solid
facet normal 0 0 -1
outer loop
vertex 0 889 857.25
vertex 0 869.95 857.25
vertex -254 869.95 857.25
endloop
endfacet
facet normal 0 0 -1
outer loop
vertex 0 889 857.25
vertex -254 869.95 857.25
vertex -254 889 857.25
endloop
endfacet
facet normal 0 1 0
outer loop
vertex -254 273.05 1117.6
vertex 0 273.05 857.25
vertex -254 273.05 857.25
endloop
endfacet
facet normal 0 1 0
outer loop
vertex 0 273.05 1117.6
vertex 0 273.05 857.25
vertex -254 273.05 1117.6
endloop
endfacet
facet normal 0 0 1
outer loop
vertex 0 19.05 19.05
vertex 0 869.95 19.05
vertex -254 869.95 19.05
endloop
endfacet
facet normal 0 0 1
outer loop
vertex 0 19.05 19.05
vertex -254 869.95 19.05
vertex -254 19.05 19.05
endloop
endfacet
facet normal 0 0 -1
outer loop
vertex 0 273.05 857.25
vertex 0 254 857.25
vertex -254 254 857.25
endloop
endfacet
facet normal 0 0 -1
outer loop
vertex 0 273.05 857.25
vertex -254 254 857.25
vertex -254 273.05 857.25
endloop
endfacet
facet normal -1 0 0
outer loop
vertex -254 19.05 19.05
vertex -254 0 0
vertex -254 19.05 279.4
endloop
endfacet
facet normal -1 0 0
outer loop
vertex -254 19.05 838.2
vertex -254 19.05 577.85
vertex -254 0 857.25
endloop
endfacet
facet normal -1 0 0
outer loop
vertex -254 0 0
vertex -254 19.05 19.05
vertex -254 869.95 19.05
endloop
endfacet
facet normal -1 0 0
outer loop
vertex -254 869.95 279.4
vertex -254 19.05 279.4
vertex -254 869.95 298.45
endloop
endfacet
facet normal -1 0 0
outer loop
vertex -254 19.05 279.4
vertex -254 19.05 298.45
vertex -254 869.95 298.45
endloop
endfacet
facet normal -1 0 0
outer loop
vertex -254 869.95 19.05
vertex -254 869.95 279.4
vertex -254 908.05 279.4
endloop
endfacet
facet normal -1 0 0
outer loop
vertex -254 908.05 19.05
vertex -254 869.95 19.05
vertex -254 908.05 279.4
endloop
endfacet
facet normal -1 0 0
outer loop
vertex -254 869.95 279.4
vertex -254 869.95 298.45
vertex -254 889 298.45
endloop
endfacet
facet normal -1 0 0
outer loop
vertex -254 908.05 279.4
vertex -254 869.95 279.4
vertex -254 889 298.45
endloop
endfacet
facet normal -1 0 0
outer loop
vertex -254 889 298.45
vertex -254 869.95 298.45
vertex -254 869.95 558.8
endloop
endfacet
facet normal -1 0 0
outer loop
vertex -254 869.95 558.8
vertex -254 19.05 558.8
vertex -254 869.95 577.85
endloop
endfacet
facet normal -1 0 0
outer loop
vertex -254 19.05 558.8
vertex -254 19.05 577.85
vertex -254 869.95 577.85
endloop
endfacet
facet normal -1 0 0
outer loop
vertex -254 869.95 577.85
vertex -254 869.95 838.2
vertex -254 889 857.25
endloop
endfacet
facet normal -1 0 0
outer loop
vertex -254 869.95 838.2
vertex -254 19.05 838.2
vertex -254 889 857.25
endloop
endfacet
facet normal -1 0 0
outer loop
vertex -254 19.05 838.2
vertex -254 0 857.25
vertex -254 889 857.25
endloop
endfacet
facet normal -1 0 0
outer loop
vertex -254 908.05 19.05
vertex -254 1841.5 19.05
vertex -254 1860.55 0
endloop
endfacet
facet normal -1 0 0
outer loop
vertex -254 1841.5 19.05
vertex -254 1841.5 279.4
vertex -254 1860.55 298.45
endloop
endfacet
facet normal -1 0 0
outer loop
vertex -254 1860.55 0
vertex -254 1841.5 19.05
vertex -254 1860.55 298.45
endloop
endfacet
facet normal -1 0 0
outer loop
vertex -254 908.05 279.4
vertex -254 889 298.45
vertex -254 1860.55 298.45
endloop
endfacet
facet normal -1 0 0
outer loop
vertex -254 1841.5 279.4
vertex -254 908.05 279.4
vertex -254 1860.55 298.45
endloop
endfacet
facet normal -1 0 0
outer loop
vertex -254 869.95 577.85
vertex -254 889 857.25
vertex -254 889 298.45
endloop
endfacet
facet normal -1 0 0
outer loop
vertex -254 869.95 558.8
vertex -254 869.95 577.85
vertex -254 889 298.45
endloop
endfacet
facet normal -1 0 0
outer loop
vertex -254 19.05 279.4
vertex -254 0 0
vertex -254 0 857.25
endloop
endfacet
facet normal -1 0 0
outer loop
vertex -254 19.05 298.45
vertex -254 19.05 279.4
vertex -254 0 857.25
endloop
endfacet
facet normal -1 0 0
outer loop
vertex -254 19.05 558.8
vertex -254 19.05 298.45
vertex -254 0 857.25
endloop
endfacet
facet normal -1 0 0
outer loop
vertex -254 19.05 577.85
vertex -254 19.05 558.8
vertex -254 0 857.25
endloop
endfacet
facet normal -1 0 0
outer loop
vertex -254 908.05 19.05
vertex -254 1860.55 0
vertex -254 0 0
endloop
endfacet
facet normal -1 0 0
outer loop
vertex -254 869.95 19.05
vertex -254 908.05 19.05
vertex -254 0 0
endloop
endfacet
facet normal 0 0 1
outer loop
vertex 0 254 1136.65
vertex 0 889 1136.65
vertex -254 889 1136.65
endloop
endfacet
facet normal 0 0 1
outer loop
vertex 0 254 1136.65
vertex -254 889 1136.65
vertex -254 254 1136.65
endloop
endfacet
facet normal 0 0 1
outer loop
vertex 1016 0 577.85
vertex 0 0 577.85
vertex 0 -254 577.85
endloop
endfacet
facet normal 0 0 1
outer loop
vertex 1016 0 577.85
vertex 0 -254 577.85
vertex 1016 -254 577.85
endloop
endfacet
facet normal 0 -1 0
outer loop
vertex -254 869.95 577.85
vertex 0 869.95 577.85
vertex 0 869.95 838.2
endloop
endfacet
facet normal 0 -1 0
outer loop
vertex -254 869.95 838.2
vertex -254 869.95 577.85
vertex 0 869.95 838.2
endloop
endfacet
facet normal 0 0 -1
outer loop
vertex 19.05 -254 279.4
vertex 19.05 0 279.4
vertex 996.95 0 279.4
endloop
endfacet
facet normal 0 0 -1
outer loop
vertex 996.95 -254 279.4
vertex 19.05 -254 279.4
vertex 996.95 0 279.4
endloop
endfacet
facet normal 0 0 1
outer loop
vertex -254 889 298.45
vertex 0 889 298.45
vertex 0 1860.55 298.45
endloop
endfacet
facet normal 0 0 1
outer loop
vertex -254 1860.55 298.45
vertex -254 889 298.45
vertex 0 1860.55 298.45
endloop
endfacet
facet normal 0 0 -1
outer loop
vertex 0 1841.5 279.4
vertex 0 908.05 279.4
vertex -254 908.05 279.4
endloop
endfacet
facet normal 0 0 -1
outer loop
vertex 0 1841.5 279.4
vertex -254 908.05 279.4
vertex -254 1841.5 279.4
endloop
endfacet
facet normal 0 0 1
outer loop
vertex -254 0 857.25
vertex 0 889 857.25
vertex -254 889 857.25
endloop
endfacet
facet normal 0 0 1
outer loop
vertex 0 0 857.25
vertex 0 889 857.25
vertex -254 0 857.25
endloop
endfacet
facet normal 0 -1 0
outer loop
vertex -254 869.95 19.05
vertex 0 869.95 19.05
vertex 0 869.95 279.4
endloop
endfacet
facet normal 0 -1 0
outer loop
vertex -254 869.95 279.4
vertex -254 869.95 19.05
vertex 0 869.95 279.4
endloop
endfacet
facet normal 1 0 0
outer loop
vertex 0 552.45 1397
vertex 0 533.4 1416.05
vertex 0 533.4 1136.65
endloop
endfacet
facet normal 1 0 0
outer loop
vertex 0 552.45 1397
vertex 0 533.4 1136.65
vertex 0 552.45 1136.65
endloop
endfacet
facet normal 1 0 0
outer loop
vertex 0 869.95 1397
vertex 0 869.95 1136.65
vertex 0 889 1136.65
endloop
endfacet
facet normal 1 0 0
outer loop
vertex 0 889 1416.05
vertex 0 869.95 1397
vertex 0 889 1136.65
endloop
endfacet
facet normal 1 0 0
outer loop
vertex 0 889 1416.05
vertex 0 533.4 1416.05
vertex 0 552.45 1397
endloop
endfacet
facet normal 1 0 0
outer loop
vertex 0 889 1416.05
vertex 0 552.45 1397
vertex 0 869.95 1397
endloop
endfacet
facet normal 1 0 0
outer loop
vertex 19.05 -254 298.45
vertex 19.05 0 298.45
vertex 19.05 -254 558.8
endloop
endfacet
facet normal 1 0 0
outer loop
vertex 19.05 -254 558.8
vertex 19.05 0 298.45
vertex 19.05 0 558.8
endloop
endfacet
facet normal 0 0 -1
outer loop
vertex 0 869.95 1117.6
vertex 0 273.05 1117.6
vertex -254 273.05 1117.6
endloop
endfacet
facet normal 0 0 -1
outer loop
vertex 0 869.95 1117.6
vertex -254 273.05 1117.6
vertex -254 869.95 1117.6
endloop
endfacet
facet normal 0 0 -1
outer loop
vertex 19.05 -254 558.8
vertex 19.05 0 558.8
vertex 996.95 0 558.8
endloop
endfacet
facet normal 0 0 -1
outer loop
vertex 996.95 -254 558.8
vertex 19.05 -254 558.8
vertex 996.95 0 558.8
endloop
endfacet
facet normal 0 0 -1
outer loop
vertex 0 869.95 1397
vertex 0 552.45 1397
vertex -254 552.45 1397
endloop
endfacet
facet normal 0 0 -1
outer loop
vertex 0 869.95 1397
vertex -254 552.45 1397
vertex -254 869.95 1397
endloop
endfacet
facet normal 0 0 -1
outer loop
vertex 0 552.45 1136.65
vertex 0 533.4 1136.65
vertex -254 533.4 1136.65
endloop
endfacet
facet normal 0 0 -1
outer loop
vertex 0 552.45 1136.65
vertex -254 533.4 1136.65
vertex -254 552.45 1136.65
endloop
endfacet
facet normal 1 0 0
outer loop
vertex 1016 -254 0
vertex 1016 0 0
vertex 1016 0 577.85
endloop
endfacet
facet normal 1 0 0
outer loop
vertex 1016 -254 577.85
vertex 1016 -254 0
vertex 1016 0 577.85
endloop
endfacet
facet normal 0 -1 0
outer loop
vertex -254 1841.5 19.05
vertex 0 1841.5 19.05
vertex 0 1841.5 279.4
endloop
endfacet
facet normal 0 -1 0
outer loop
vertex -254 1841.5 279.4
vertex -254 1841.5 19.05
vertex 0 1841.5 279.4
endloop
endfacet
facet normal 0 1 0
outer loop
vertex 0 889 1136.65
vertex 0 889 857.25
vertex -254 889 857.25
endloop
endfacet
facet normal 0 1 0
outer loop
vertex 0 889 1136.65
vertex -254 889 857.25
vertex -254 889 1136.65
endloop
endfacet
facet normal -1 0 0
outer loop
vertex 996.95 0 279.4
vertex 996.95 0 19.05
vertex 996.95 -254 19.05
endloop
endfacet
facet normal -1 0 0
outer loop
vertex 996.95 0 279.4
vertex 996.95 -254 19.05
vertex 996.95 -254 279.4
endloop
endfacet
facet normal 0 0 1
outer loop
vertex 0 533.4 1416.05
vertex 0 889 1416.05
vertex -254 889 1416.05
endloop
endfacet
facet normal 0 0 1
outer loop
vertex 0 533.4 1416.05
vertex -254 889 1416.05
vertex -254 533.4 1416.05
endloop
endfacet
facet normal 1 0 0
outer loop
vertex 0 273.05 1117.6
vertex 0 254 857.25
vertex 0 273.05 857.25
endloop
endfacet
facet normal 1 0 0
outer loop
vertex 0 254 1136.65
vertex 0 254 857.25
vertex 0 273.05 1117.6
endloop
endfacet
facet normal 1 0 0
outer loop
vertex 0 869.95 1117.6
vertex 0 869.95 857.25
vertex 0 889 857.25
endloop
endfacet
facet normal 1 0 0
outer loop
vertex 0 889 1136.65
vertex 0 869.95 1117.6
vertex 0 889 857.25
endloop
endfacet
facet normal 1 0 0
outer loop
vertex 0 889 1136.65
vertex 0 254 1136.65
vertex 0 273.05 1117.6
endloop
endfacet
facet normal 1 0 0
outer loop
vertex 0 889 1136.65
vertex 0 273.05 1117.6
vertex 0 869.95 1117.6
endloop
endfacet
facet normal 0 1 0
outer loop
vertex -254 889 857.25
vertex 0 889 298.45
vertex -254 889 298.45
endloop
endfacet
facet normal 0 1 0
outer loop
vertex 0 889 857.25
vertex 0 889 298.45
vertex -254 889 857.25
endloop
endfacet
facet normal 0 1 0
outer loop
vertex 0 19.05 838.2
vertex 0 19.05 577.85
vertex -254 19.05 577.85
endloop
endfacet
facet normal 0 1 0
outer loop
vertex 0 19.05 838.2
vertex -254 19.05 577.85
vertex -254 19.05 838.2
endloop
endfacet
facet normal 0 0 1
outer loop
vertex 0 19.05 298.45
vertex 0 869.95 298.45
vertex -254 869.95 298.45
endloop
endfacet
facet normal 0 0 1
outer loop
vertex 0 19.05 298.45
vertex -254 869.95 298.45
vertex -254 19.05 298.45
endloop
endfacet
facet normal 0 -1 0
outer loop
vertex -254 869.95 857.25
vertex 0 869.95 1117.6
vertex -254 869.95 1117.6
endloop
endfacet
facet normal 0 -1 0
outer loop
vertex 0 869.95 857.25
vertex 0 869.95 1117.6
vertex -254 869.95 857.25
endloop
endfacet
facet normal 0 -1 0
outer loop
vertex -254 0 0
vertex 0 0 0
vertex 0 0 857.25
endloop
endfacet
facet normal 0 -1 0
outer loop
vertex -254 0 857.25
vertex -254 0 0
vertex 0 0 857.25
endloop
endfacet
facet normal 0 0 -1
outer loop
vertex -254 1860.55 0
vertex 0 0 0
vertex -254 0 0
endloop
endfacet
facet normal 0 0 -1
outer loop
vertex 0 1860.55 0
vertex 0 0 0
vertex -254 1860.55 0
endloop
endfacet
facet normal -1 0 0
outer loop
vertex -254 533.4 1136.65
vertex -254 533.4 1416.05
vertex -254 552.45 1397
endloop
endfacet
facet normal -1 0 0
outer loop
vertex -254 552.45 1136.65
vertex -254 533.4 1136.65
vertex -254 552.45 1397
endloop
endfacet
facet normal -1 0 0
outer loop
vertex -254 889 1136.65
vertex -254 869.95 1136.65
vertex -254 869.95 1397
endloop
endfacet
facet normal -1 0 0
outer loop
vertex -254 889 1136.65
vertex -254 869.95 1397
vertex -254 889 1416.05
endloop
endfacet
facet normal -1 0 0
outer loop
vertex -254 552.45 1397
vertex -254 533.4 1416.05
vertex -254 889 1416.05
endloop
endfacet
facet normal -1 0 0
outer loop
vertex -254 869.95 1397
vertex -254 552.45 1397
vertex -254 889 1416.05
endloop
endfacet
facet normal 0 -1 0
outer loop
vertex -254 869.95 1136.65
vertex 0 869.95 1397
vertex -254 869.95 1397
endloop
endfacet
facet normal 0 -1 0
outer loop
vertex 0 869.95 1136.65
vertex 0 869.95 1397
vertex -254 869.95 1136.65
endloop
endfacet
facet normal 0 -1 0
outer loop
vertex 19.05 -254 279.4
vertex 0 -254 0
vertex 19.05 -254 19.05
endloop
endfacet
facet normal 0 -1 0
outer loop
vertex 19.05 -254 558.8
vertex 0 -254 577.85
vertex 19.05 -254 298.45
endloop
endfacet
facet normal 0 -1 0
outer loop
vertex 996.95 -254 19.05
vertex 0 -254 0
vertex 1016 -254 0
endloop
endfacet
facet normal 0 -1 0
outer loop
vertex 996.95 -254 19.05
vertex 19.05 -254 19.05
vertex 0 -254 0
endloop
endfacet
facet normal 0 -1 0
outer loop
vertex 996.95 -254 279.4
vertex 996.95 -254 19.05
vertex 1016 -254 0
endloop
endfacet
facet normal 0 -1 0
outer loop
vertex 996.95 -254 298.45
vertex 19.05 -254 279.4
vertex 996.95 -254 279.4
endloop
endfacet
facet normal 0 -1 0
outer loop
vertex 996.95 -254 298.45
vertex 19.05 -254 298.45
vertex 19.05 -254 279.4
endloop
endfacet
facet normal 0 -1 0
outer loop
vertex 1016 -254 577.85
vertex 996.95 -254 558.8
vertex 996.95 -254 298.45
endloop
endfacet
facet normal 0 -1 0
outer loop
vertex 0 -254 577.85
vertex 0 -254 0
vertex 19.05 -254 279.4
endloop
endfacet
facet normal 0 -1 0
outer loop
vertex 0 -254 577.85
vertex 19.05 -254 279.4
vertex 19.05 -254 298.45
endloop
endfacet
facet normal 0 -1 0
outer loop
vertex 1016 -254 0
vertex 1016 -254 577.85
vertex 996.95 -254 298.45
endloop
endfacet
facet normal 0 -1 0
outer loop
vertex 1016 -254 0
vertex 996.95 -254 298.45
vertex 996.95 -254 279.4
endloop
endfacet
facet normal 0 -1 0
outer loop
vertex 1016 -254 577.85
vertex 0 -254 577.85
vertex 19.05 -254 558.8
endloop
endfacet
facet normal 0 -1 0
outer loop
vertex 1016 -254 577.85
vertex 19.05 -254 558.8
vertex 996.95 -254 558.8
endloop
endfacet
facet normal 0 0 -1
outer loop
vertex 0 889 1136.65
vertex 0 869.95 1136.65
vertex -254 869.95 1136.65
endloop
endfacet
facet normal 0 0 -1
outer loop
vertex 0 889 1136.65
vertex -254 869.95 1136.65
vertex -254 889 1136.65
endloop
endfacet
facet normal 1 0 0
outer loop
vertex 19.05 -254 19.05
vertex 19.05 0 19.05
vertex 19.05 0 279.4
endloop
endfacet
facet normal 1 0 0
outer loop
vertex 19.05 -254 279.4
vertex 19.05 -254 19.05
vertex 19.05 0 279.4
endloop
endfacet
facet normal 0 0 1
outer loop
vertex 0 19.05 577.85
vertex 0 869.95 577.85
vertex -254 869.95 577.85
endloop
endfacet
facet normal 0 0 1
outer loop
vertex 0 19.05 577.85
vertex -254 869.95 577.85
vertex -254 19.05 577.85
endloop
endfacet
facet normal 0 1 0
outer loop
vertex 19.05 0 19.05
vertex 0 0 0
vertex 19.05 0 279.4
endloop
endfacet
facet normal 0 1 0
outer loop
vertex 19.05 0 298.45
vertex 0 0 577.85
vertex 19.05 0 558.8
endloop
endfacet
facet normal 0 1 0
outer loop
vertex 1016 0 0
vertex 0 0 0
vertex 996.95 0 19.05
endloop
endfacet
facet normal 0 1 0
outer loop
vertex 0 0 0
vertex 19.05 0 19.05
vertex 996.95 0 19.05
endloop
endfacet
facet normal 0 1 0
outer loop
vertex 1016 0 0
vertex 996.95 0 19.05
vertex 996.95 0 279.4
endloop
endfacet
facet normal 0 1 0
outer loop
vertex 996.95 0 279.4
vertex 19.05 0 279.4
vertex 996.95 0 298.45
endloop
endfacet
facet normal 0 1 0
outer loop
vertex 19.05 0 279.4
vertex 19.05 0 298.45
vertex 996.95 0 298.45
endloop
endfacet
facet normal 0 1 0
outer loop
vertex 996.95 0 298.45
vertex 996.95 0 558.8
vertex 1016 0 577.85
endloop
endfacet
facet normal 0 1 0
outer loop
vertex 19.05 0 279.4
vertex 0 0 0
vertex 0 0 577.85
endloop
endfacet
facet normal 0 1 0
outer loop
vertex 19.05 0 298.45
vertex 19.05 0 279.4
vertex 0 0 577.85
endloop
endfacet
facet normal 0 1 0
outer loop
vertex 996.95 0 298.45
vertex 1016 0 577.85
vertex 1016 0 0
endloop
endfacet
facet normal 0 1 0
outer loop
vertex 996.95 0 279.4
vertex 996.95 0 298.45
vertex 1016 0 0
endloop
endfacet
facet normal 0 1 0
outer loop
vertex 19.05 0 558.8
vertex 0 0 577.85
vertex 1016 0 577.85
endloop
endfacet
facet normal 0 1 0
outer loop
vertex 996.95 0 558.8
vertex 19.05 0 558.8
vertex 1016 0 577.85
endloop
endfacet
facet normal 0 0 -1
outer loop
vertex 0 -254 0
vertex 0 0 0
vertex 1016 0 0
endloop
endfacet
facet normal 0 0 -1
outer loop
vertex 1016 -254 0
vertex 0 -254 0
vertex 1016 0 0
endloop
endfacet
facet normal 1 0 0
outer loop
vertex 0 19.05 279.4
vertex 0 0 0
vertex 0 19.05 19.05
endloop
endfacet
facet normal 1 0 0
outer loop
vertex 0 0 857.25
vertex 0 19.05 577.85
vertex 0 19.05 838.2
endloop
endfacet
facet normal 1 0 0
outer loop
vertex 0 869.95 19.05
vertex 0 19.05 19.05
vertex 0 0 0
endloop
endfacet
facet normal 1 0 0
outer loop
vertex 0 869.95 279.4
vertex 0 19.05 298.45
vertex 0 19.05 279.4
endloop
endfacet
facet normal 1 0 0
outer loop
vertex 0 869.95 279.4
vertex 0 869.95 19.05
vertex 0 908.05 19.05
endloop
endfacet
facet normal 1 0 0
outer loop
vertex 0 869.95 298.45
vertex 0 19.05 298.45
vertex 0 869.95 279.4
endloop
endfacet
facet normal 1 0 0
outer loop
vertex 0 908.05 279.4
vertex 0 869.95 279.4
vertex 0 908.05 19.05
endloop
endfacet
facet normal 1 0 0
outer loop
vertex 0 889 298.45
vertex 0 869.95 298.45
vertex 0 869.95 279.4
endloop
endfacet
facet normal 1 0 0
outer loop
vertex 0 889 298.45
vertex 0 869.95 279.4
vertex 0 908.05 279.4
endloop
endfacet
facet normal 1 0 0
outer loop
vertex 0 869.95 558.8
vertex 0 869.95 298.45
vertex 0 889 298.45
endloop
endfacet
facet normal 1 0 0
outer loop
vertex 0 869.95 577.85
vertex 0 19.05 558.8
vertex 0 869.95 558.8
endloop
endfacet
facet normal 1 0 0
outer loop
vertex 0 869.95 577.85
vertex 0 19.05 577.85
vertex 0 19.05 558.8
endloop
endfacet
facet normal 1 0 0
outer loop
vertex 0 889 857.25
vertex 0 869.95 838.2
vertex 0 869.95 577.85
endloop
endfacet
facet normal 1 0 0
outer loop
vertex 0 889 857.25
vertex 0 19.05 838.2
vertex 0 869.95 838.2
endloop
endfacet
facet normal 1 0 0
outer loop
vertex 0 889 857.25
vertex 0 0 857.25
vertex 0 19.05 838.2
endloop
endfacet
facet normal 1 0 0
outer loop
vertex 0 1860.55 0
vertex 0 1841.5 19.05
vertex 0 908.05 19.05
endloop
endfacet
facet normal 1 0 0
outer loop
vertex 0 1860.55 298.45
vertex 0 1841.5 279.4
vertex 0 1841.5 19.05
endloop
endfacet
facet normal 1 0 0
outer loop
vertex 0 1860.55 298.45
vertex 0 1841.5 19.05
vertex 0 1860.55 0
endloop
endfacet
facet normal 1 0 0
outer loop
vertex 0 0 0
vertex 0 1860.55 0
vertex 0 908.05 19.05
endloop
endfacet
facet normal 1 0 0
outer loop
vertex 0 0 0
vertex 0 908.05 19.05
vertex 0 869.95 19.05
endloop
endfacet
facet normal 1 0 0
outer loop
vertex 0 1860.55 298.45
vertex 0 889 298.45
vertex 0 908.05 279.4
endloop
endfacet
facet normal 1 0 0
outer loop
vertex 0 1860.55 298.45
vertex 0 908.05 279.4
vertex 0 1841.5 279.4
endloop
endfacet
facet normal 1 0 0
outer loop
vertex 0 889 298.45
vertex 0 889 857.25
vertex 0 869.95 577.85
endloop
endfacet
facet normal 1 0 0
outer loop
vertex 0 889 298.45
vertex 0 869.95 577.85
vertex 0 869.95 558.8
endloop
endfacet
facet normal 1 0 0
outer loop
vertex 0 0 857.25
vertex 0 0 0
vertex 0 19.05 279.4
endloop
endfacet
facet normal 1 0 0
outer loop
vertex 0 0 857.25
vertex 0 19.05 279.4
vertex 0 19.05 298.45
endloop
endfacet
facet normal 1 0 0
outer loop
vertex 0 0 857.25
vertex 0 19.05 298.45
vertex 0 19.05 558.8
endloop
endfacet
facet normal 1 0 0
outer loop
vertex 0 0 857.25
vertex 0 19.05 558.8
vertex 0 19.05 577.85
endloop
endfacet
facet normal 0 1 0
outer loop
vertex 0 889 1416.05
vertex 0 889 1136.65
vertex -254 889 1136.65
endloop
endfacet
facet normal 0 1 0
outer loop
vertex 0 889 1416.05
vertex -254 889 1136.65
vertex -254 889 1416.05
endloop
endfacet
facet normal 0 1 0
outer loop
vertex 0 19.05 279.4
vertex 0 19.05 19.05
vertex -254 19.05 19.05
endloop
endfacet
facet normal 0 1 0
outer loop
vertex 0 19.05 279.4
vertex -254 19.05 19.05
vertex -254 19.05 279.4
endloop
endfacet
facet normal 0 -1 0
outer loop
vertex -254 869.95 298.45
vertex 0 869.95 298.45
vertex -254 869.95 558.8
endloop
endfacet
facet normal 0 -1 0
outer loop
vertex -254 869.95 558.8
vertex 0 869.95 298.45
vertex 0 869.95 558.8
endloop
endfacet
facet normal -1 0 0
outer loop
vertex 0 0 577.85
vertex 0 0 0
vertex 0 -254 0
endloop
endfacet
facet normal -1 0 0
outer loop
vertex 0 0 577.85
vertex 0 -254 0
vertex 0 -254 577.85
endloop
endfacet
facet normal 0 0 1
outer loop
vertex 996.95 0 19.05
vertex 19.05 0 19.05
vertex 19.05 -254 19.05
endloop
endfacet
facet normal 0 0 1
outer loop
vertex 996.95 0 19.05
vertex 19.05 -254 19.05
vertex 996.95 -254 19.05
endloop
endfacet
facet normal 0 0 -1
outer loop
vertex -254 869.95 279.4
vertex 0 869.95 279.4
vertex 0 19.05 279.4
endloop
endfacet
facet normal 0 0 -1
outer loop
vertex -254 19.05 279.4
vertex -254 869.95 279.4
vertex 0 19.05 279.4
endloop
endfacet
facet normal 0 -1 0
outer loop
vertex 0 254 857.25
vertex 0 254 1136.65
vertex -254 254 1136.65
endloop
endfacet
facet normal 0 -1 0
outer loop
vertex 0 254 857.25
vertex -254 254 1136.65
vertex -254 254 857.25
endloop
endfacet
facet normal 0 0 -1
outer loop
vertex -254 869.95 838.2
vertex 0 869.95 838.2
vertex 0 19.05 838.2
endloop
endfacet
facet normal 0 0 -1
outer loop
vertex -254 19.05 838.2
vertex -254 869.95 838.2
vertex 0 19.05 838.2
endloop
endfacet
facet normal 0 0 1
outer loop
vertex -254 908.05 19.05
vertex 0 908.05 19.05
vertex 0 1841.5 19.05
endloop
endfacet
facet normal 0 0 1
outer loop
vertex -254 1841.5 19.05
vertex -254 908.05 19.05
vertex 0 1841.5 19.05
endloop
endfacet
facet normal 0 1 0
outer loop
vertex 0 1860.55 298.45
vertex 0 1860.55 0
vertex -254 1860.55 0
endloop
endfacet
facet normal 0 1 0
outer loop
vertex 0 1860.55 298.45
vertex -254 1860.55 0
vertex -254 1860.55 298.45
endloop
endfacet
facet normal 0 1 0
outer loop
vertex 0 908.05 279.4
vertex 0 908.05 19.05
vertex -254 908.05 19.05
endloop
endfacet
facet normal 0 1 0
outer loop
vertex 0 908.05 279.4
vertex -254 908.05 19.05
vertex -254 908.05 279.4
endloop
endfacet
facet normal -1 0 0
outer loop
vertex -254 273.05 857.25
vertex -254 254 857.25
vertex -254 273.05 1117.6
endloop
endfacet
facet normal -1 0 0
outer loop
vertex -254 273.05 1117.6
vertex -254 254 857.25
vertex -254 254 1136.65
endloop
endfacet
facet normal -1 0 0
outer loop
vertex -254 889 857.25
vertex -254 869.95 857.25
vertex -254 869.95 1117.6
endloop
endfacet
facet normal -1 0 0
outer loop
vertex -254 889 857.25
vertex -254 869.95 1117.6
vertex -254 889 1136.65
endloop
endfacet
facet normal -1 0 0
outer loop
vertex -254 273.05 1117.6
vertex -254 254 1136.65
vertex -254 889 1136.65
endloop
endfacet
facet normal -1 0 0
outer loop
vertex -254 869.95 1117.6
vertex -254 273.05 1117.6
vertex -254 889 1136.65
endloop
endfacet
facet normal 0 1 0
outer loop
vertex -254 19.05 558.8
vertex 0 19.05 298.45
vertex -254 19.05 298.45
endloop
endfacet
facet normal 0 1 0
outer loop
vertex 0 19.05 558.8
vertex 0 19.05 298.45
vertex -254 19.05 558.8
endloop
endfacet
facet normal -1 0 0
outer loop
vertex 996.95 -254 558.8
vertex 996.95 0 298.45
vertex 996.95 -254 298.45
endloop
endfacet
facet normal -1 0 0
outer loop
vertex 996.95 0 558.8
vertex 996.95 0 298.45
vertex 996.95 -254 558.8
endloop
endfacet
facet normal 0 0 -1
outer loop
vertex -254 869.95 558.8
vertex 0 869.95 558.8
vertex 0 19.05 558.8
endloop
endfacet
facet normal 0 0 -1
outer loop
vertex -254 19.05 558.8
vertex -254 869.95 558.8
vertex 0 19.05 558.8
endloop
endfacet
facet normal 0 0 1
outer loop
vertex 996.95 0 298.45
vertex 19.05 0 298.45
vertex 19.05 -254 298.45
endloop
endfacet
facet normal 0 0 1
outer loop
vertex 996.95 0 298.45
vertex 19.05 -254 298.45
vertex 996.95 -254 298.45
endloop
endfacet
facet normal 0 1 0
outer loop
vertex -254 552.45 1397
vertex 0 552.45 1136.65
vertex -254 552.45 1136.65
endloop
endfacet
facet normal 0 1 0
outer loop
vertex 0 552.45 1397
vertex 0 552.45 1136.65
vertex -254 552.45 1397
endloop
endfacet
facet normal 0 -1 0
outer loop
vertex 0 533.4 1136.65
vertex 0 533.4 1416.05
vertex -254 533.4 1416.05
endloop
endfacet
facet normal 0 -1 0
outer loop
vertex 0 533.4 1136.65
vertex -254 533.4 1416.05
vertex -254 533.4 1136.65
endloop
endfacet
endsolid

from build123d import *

# Parameters (mm, degrees)
F0_W      = 1016
F0_H      = 577.85
F0_W_2    = 977.9
F0_H_2    = 260.35
F1_DEPTH  = 254
F2_W      = 889
F2_H      = 857.25
F2_W_2    = 850.9
F2_H_2    = 260.35
F3_DEPTH  = 254
F6_DEPTH  = 254
F8_DEPTH  = 254
F9_W      = 971.55
F9_H      = 298.45
F9_W_2    = 933.45
F9_H_2    = 260.35
F10_DEPTH = 254


with BuildPart() as f1:
    # F0 (on Front) → F1 (new body)
    with BuildSketch(Plane.XZ):
        with Locations((508, 288.925)):
            Rectangle(F0_W, F0_H)
        with Locations((508, 149.225)):
            Rectangle(F0_W_2, F0_H_2, mode=Mode.SUBTRACT)
        with Locations((508, 428.625)):
            Rectangle(F0_W_2, F0_H_2, mode=Mode.SUBTRACT)
    extrude(amount=F1_DEPTH)


with BuildPart() as f3:
    # F2 (on face) → F3 (new body)
    with BuildSketch(Plane(origin=(0, 0, 0), x_dir=(0, -1, 0), z_dir=(-1, 0, 0))):
        with Locations((-444.5, 428.625)):
            Rectangle(F2_W, F2_H)
        with Locations((-444.5, 149.225)):
            Rectangle(F2_W_2, F2_H_2, mode=Mode.SUBTRACT)
        with Locations((-444.5, 428.625)):
            Rectangle(F2_W_2, F2_H_2, mode=Mode.SUBTRACT)
        with Locations((-444.5, 708.025)):
            Rectangle(F2_W_2, F2_H_2, mode=Mode.SUBTRACT)
    extrude(amount=F3_DEPTH)

    # F9 (on face) → F10 (join)
    with BuildSketch(Plane.YZ):
        with Locations((1374.775, 149.225)):
            Rectangle(F9_W, F9_H)
        with Locations((1374.775, 149.225)):
            Rectangle(F9_W_2, F9_H_2, mode=Mode.SUBTRACT)
    extrude(amount=-F10_DEPTH)


with BuildPart() as f6:
    # F5 (on face) → F6 (new body)
    with BuildSketch(Plane.YZ):
        Polygon((889, 857.25), (889, 1136.65), (254, 1136.65), (254, 857.25), (273.05, 857.25), (273.05, 1117.6), (869.95, 1117.6), (869.95, 857.25), align=None)
    extrude(amount=-F6_DEPTH)


with BuildPart() as f8:
    # F7 (on face) → F8 (new body)
    with BuildSketch(Plane.YZ):
        Polygon((533.4, 1416.05), (533.4, 1136.65), (552.45, 1136.65), (552.45, 1397), (869.95, 1397), (869.95, 1136.65), (889, 1136.65), (889, 1416.05), align=None)
    extrude(amount=-F8_DEPTH)


solid = Compound([f1.part, f3.part, f6.part, f8.part])
